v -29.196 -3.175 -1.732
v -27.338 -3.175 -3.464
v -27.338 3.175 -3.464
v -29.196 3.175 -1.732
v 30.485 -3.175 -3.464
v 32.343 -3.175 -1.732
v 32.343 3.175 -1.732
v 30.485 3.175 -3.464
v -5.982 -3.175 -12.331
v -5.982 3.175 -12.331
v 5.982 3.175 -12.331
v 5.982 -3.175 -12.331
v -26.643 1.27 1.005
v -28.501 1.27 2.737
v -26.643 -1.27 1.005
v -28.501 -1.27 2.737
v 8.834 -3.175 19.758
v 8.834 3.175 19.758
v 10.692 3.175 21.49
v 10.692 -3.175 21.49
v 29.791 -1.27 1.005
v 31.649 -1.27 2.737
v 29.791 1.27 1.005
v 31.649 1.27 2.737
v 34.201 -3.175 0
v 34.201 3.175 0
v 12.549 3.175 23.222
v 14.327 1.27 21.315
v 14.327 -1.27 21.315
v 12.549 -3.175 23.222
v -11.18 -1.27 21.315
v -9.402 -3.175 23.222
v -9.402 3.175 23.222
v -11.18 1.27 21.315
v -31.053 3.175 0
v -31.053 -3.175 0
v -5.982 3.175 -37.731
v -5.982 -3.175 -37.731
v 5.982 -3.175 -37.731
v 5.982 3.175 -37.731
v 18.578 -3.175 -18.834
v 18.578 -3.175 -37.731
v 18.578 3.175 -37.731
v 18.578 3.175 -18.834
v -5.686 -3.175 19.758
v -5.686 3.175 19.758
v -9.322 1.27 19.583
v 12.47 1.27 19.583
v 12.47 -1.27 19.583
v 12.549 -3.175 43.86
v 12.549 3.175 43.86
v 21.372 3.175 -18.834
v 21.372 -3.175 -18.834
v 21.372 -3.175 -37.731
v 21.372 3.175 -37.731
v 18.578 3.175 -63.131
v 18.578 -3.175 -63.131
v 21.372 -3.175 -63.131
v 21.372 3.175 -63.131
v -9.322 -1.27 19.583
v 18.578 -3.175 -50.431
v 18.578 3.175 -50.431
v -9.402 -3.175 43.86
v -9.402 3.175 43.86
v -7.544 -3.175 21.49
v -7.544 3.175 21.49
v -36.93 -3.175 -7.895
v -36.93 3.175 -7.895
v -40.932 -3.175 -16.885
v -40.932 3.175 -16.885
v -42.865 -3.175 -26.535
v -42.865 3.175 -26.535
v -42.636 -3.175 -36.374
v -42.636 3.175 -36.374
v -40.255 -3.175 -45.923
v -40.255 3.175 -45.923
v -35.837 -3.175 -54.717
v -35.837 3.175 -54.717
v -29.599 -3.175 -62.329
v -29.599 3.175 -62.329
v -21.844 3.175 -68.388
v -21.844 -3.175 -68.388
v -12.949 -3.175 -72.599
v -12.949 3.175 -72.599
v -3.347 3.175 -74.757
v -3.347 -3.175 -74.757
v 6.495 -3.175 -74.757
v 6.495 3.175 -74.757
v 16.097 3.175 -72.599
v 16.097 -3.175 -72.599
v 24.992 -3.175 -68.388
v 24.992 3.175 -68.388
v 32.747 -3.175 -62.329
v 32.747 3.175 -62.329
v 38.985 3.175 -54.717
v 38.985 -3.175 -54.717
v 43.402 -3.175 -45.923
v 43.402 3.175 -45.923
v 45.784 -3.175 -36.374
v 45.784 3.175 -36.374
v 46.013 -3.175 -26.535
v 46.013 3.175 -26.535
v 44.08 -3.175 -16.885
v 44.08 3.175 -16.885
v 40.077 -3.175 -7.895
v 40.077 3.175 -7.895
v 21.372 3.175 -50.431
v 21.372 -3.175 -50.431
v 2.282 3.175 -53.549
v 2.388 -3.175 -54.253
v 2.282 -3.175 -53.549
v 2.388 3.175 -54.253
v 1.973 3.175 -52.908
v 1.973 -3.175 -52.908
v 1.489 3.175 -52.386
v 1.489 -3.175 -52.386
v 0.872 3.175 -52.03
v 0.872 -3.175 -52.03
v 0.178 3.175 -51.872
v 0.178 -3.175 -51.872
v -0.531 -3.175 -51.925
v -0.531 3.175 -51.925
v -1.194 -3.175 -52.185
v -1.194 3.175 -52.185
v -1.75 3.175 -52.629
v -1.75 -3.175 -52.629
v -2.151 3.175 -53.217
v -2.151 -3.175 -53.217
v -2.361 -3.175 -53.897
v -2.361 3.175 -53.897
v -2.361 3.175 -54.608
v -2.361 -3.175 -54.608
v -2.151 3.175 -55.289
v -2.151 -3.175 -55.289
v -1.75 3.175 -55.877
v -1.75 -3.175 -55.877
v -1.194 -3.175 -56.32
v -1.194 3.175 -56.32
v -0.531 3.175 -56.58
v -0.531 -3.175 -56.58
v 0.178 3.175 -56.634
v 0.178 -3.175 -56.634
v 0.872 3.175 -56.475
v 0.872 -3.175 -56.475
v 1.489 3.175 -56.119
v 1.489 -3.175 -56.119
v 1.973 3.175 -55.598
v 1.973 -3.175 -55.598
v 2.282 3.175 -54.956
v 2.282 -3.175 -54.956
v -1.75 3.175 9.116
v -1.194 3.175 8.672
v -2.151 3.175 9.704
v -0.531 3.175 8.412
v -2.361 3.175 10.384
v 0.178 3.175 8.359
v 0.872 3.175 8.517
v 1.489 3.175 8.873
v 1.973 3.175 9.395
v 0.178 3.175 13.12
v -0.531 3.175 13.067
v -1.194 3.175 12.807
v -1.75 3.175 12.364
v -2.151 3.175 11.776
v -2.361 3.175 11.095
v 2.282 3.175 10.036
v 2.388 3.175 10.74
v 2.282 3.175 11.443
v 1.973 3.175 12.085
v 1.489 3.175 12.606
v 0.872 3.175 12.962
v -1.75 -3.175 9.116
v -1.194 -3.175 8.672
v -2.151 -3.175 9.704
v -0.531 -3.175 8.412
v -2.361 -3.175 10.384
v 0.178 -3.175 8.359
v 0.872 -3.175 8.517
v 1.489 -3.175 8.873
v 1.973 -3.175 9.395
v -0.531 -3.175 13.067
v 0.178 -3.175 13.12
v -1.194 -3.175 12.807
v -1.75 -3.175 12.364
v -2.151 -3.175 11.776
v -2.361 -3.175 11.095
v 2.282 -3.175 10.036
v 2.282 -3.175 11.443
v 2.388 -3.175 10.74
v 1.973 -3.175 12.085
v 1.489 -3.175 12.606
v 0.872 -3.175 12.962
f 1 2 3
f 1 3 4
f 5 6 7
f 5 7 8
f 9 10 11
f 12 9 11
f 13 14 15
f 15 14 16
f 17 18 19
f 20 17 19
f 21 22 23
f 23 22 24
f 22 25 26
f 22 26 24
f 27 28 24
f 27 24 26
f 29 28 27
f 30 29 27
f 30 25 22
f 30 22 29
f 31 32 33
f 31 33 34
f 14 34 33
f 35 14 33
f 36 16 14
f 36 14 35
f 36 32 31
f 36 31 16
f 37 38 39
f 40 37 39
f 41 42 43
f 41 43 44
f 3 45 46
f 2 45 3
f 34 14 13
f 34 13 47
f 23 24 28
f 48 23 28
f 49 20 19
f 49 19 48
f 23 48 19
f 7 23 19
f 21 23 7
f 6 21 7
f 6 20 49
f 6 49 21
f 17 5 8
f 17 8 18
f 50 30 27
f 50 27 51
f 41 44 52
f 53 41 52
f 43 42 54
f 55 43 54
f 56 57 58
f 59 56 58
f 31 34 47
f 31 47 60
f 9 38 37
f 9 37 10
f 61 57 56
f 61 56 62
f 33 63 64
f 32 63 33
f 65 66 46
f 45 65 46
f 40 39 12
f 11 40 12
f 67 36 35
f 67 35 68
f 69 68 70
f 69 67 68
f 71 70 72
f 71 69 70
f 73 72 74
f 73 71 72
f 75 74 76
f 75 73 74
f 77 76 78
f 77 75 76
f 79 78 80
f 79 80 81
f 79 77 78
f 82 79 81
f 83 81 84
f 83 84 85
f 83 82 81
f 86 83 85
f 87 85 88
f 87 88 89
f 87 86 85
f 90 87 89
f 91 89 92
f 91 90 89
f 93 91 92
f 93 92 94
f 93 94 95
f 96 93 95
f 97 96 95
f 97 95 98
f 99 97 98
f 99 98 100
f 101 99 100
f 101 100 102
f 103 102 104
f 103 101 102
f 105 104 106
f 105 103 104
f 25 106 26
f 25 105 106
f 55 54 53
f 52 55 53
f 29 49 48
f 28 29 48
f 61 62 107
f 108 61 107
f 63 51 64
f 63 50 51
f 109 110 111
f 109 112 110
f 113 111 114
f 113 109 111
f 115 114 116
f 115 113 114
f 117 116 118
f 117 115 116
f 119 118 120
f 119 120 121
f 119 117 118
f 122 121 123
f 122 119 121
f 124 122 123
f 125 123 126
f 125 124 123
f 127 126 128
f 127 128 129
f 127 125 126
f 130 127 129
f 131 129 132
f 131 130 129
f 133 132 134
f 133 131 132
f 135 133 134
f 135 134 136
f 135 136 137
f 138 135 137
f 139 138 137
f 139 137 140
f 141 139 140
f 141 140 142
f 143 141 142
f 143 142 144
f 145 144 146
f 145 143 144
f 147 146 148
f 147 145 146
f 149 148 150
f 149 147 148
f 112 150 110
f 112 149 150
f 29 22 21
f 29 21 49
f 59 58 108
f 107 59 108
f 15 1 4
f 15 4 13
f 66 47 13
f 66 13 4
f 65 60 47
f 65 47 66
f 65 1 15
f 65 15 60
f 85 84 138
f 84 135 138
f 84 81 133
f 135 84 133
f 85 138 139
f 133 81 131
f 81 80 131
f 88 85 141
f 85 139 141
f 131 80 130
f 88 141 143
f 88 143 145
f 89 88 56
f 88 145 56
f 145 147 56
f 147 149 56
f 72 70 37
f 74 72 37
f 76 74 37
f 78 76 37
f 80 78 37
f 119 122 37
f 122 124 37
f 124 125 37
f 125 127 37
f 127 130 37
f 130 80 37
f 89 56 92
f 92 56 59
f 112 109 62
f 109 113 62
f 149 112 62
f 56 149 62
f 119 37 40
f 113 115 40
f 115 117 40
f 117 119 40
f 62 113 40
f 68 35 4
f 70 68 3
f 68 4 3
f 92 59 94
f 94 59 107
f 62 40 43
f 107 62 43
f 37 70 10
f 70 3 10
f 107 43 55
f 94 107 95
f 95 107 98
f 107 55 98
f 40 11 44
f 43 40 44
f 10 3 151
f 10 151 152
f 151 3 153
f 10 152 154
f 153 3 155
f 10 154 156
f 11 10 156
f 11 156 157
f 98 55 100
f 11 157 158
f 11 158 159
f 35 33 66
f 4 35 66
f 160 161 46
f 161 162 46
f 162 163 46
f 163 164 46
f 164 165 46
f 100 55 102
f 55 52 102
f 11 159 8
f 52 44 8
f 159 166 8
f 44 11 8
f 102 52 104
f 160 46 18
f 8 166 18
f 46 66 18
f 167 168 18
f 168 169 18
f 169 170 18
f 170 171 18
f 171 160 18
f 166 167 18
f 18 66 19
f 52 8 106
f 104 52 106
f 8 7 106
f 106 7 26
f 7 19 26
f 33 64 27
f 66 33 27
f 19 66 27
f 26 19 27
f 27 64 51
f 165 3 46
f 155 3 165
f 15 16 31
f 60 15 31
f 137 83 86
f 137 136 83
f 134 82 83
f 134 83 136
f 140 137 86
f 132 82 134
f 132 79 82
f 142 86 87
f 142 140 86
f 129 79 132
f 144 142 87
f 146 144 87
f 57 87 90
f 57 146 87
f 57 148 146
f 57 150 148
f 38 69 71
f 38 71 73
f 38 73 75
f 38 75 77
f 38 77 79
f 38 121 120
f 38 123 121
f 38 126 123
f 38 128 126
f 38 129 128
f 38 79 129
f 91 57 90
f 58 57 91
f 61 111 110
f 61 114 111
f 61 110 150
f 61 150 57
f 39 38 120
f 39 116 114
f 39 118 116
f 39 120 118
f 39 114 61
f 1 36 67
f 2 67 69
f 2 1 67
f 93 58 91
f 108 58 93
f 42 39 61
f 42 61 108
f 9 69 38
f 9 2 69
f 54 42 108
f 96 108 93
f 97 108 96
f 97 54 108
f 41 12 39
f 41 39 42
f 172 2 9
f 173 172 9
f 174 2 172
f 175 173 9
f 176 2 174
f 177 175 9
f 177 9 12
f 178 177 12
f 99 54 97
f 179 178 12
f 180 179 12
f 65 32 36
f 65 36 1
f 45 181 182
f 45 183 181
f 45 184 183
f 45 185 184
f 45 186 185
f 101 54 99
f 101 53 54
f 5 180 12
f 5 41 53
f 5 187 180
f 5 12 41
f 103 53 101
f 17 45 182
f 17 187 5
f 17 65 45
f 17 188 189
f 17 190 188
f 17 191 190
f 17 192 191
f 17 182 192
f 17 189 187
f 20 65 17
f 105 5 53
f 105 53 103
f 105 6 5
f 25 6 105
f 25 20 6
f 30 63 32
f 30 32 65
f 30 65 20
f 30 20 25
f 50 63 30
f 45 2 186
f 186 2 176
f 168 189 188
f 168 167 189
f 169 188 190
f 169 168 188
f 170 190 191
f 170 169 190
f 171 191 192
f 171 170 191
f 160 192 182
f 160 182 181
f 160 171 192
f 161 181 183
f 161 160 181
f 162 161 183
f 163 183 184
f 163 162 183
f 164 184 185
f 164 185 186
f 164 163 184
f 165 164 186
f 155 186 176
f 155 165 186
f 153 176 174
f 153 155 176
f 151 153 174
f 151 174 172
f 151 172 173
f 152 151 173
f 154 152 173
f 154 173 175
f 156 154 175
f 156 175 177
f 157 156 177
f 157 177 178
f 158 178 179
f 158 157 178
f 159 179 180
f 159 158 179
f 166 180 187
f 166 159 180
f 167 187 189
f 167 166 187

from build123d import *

# Parameters (mm, degrees)
F0_R     = 2.3876
F0_W     = 11.9644477963
F0_H     = 25.4
F0_W_2   = 2.794
F0_H_2   = 12.7
F0_H_3   = 18.8976
F1_DEPTH = 3.175
F3_W     = 2.54
F3_H     = 25.4
F4_DEPTH = 2.54
F6_W     = 2.54
F6_H     = 25.4
F7_DEPTH = 2.54


with BuildPart() as f1:
    # F0 (on Front) → F1 (new body, symmetric)
    with BuildSketch(Plane.XZ):
        with BuildLine():
            Line((-9.4017383467, 23.2221963037), (-31.0533456504, 0))
            ThreePointArc((-31.0533456504, 0), (1.5738401562, -75.0292582617), (34.2010259628, 0))
            Line((34.2010259628, 0), (12.5494186591, 23.2221963037))
            Line((12.5494186591, 23.2221963037), (12.5494186591, 43.8596963037))
            Line((12.5494186591, 43.8596963037), (-9.4017383467, 43.8596963037))
            Line((-9.4017383467, 43.8596963037), (-9.4017383467, 23.2221963037))
        make_face()
        with Locations((0, -54.2525947094)):
            Circle(F0_R, mode=Mode.SUBTRACT)
        with Locations((0, -25.0313151628)):
            Rectangle(F0_W, F0_H, mode=Mode.SUBTRACT)
        with Locations((19.9750838982, -56.7813151628)):
            Rectangle(F0_W_2, F0_H_2, mode=Mode.SUBTRACT)
        with Locations((19.9750838982, -28.2825151628)):
            Rectangle(F0_W_2, F0_H_3, mode=Mode.SUBTRACT)
        Polygon((-29.1955699461, -1.7321285843), (-7.5439626424, 21.4900677194), (-5.6861869381, 19.7579391351), (-27.3377942419, -3.4642571686), align=None, mode=Mode.SUBTRACT)
        with Locations((0, 10.739565827)):
            Circle(F0_R, mode=Mode.SUBTRACT)
        Polygon((8.8338672505, 19.7579391351), (10.6916429548, 21.4900677194), (32.3432502585, -1.7321285843), (30.4854745542, -3.4642571686), align=None, mode=Mode.SUBTRACT)
    extrude(amount=F1_DEPTH, both=True)

    # F3 (on offset) → F4 (cut)
    with BuildSketch(Plane(origin=(-16.6122141895, 0, 15.4886787354), x_dir=(0, -1, 0), z_dir=(-0.7314077576, 0, 0.6819403875))):
        with Locations((0, -4.733831039)):
            Rectangle(F3_W, F3_H)
    extrude(amount=-F4_DEPTH, mode=Mode.SUBTRACT)

    # F6 (on offset) → F7 (cut)
    with BuildSketch(Plane(origin=(18.2960887755, 0, 17.0586676721), x_dir=(0, 1, 0), z_dir=(0.7314077576, 0, 0.6819403875))):
        with Locations((0, -6.8803708986)):
            Rectangle(F6_W, F6_H)
    extrude(amount=-F7_DEPTH, mode=Mode.SUBTRACT)


solid = f1.part
